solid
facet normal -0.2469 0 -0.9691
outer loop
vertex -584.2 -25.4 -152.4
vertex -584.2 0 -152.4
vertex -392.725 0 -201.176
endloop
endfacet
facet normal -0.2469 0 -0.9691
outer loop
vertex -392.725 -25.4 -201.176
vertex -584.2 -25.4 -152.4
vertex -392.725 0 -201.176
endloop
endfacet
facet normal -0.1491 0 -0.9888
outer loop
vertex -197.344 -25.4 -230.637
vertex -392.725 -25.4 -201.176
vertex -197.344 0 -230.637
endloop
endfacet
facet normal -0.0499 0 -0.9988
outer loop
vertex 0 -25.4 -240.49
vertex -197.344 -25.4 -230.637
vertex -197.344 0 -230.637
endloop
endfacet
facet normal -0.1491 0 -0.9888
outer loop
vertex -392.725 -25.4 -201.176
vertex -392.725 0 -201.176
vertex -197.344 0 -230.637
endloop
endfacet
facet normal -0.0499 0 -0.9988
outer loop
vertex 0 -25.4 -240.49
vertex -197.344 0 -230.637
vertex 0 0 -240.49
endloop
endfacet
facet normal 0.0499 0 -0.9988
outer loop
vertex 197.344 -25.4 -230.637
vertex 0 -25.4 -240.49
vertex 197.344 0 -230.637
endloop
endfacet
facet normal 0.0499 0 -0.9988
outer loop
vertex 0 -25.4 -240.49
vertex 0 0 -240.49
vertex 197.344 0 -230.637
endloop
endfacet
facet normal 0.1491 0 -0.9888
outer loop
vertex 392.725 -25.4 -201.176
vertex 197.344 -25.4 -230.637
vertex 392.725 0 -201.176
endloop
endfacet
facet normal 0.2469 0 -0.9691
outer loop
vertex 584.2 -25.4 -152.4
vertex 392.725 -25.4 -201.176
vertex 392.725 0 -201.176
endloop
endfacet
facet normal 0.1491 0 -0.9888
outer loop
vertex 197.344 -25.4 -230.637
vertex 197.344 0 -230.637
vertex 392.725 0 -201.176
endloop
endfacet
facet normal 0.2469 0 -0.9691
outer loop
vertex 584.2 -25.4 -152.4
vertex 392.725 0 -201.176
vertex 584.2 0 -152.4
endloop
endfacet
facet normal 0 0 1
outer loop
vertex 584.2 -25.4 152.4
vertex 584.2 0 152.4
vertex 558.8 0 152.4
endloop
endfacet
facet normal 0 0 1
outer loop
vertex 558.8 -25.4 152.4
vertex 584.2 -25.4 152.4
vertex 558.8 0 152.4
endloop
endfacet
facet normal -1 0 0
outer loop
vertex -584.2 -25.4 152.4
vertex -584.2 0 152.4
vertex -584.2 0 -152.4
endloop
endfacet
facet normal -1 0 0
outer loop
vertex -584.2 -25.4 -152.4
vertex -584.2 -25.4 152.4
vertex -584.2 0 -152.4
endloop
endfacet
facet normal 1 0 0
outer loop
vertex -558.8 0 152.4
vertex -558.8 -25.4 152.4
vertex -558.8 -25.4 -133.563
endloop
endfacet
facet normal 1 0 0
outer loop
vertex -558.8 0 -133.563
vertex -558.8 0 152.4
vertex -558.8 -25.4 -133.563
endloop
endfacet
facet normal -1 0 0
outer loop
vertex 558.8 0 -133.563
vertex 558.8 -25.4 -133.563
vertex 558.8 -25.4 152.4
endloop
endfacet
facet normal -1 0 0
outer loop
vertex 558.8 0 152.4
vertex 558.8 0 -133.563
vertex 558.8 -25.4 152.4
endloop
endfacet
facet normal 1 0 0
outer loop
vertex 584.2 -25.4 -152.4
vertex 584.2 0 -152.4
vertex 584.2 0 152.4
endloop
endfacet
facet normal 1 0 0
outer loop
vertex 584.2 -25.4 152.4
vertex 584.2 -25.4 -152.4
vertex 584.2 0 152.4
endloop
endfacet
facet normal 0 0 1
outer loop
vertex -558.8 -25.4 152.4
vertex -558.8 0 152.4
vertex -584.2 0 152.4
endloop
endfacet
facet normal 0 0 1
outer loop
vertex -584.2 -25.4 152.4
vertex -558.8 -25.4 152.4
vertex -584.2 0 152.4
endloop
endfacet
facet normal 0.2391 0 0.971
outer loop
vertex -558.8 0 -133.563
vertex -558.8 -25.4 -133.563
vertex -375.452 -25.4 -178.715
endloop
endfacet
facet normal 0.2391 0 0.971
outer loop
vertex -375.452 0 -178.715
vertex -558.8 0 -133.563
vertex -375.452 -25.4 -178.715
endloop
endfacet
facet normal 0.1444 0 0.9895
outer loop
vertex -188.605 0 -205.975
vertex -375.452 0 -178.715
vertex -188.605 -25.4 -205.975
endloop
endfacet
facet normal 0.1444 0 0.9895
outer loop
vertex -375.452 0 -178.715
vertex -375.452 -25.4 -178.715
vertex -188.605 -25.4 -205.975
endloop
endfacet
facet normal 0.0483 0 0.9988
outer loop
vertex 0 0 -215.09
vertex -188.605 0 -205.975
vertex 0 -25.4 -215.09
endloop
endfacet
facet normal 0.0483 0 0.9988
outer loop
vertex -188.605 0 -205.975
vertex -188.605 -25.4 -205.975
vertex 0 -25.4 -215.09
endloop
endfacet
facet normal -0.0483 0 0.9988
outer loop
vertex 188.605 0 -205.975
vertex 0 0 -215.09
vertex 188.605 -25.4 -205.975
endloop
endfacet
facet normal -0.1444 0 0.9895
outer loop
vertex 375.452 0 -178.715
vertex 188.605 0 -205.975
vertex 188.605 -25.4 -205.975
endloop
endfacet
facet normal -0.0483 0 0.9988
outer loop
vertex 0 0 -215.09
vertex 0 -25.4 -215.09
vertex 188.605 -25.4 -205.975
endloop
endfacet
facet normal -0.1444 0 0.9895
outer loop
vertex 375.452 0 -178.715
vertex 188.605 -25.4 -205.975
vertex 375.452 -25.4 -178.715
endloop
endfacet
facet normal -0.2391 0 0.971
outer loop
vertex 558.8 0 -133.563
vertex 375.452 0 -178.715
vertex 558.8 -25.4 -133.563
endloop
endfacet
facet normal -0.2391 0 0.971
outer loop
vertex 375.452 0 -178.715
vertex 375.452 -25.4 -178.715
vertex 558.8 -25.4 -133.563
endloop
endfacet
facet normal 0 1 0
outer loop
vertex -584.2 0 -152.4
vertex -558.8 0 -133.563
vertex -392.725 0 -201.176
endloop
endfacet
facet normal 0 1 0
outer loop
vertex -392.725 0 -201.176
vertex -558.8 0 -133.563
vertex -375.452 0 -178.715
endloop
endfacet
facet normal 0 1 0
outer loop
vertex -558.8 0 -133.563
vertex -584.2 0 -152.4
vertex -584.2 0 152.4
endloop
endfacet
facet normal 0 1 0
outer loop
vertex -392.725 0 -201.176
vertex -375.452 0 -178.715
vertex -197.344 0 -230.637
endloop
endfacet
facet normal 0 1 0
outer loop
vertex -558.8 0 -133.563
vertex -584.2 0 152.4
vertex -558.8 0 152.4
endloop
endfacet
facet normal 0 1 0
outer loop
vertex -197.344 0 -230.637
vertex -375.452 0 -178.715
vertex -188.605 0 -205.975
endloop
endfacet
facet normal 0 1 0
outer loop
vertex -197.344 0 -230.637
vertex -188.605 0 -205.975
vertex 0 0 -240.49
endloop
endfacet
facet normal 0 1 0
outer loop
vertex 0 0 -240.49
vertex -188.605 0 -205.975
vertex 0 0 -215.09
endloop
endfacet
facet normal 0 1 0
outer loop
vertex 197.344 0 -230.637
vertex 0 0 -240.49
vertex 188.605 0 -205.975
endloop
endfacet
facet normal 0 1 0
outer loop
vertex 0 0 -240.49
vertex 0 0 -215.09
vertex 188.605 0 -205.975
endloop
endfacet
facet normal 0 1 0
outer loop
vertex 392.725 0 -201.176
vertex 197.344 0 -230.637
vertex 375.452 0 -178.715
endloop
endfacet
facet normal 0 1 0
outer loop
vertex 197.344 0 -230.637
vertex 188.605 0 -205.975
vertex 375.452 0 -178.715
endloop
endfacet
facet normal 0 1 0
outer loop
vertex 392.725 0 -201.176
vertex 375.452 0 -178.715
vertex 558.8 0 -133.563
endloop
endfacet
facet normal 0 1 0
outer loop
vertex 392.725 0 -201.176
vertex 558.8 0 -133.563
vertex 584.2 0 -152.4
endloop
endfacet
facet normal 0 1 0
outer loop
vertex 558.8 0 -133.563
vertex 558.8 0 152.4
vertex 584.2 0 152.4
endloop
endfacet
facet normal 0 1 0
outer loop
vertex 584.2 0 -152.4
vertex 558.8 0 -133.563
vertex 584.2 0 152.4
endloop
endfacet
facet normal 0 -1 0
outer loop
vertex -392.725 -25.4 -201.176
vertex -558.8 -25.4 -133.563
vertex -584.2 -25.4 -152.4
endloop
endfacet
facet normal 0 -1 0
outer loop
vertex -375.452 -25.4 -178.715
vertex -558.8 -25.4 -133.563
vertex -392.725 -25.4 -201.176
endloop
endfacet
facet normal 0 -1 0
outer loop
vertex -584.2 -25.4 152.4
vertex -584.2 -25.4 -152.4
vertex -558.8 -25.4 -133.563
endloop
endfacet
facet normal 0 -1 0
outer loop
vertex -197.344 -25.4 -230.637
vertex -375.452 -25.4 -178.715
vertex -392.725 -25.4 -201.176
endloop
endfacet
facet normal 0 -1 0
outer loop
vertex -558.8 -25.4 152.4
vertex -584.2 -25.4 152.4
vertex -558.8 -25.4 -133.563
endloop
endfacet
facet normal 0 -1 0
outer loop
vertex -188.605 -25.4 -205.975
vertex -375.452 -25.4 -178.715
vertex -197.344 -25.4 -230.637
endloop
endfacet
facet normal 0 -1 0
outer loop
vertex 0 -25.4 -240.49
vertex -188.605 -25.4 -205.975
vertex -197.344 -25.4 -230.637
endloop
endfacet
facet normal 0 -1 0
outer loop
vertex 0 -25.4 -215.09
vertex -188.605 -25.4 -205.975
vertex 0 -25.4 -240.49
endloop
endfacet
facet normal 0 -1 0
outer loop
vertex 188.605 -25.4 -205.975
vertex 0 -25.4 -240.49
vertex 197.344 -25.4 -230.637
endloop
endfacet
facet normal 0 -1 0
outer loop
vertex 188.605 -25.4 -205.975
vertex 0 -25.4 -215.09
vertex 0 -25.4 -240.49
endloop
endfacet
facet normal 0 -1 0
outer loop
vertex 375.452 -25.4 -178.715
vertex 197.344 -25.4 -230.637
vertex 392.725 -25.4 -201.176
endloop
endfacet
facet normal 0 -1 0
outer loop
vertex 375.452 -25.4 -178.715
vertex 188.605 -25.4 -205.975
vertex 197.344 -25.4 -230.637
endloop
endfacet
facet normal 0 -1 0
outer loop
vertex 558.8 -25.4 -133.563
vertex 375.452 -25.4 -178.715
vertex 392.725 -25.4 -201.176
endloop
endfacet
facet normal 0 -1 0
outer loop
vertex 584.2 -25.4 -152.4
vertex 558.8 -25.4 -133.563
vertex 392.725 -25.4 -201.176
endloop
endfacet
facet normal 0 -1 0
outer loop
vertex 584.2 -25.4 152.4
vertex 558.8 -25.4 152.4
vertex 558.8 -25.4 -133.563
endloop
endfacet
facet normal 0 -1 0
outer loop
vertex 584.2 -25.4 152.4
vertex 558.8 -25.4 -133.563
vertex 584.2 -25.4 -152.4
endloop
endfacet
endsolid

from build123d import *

# Parameters (mm, degrees)
F1_DEPTH = 25.4
F3_DEPTH = 25.401


with BuildPart() as f1:
    # F0 (on Front) → F1 (new body)
    with BuildSketch(Plane.XZ):
        with BuildLine():
            Line((584.2, 152.4), (-584.2, 152.4))
            Line((-584.2, 152.4), (-584.2, -152.4))
            ThreePointArc((-584.2, -152.4), (0, -240.490442), (584.2, -152.4))
            Line((584.2, -152.4), (584.2, 152.4))
        make_face()
    extrude(amount=F1_DEPTH)

    # F2 (on face) → F3 (cut, through all)
    with BuildSketch(Plane.XZ.offset(25.4)):
        with BuildLine():
            Line((558.8, -133.56262), (558.8, 152.4))
            Line((558.8, 152.4), (-558.8, 152.4))
            Line((-558.8, 152.4), (-558.8, -133.56262))
            ThreePointArc((-558.8, -133.56262), (0, -215.090442), (558.8, -133.56262))
        make_face()
    extrude(amount=-F3_DEPTH, mode=Mode.SUBTRACT)


solid = f1.part
